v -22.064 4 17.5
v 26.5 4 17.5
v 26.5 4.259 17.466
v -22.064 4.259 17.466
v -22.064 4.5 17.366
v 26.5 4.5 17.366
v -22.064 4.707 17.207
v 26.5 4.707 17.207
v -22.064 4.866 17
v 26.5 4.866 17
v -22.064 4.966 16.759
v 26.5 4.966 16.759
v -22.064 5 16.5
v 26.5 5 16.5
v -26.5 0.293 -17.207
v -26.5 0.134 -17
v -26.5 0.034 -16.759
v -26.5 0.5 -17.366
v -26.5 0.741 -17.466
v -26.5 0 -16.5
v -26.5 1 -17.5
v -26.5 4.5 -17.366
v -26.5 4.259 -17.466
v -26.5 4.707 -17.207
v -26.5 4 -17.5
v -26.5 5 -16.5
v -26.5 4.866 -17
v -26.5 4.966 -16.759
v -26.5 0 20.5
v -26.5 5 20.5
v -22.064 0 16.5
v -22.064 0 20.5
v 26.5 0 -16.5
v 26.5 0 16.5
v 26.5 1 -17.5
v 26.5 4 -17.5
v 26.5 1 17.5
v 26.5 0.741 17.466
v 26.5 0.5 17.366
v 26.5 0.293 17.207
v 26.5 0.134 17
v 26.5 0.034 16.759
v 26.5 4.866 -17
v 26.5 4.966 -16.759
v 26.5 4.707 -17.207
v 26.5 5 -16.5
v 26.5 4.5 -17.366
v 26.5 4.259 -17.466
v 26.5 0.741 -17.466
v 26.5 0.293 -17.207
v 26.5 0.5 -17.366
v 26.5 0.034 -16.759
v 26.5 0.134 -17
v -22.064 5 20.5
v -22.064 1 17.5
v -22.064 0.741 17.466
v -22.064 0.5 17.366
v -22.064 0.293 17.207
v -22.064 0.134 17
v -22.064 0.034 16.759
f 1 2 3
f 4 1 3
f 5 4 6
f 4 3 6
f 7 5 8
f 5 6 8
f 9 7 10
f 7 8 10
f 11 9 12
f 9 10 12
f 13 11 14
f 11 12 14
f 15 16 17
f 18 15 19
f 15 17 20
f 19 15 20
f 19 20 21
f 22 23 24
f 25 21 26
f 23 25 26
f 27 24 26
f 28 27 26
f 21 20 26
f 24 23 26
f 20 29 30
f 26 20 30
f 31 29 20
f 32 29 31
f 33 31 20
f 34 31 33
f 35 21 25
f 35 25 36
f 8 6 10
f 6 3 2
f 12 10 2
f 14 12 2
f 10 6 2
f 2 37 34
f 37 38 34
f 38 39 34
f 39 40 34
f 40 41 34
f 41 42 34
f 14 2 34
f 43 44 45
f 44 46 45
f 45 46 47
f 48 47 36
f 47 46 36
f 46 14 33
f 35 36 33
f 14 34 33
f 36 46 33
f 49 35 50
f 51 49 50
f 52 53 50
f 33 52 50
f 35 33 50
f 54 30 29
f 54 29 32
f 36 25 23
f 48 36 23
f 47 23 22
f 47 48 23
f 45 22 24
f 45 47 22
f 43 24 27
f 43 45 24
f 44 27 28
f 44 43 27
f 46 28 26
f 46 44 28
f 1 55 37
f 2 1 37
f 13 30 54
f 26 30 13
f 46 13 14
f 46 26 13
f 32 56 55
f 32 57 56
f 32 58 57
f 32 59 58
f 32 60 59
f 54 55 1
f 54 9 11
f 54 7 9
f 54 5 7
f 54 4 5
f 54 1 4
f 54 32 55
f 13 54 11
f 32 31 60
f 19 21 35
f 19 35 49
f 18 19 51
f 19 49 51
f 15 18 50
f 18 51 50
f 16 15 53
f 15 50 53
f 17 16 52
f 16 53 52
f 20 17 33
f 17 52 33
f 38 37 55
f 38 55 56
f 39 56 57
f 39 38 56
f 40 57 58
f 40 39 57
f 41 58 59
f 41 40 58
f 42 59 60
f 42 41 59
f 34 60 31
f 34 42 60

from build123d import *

# Parameters (mm, degrees)
SKETCH1_W                = 53
SKETCH1_H                = 35
BOSS_EXTRUDE1_DEPTH      = 5
FILLET1_R                = 1
SKETCH2_W                = 4.435881082
SKETCH2_H                = 5
BOSS_EXTRUDE2_DEPTH      = 3
BOSS_EXTRUDE2_DEPTH_BACK = 4.5


with BuildPart() as part:
    # Sketch1 → Boss-Extrude1 (new body)
    with BuildSketch(Plane(origin=(0, 0, 0), x_dir=(1, 0, 0), z_dir=(0, 1, 0))):
        Rectangle(SKETCH1_W, SKETCH1_H)
    extrude(amount=BOSS_EXTRUDE1_DEPTH)

    # Fillet1
    fillet1_edges = [part.edges().sort_by_distance(p)[0] for p in [
        (0, 0, 17.5),
        (0, 5, 17.5),
        (0, 0, -17.5),
        (0, 5, -17.5),
    ]]
    fillet(fillet1_edges, radius=FILLET1_R)

    # Sketch2 → Boss-Extrude2 (add, two sides)
    with BuildSketch(Plane.XY.offset(17.5)) as boss_extrude2_sk:
        with Locations((-24.282059459, 2.5)):
            Rectangle(SKETCH2_W, SKETCH2_H)
    extrude(amount=BOSS_EXTRUDE2_DEPTH)
    extrude(boss_extrude2_sk.sketch, amount=-BOSS_EXTRUDE2_DEPTH_BACK)


solid = part.part
